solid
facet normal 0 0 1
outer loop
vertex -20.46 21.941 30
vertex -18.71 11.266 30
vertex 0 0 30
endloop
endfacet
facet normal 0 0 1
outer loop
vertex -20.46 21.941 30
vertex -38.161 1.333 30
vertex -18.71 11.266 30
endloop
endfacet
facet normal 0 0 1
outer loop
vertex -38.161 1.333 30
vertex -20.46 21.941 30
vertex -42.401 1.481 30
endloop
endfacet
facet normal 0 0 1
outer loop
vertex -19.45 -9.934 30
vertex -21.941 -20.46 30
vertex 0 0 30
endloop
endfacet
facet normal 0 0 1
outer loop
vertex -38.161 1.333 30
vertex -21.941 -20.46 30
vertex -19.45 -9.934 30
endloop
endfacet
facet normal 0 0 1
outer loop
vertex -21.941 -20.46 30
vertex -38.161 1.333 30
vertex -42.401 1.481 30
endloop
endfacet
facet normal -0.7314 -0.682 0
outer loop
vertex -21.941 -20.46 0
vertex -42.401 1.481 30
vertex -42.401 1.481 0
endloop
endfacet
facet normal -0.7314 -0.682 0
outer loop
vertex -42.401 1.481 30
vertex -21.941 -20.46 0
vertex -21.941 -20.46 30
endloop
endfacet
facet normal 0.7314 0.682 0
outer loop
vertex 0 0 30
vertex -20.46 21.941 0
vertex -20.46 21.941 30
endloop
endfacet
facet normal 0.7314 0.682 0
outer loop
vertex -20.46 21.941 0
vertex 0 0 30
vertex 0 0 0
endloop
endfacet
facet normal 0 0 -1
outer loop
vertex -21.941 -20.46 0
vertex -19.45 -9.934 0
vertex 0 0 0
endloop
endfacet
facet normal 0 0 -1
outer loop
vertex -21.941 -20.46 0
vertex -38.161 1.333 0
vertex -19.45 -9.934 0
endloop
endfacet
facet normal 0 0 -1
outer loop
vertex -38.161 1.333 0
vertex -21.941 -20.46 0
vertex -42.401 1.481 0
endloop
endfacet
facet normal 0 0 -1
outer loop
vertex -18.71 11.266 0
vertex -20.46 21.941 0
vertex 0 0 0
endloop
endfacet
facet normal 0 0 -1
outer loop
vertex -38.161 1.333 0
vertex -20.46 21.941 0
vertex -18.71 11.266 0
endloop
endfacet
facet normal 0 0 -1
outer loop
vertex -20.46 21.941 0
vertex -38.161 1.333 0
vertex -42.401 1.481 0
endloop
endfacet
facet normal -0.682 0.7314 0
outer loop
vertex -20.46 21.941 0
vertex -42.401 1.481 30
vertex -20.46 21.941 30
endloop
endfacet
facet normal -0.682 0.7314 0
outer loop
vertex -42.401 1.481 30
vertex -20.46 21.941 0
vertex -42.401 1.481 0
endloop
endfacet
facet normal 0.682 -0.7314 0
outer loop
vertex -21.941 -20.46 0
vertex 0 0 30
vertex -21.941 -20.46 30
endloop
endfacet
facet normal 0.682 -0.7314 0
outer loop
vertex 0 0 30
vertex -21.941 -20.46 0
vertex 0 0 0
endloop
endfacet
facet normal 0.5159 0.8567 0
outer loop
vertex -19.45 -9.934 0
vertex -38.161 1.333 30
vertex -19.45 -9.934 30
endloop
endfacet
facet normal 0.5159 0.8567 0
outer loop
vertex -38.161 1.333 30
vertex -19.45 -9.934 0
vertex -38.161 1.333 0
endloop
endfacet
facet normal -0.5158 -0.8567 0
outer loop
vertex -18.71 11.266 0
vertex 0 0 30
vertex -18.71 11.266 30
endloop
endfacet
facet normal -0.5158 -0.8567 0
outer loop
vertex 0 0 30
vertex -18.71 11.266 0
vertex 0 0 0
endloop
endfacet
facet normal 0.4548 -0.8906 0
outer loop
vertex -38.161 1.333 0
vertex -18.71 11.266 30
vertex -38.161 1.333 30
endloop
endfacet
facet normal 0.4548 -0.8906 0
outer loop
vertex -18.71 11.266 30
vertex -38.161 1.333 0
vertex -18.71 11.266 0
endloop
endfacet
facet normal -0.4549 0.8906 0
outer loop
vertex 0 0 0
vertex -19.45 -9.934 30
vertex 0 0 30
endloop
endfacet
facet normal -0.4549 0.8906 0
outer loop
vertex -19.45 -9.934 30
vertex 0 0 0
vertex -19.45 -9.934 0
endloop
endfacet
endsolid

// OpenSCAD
rotate([0,0,88])
rotate([0,-90,0]){
    difference(){
        rotate([-45,0,0]) {
            cube([30, 30, 30]);
        }
        scale([1,0.9,0.5]) {
            rotate([-45,0,0]) {
                cube([30, 30, 30]);
            }
        }
    }
}
